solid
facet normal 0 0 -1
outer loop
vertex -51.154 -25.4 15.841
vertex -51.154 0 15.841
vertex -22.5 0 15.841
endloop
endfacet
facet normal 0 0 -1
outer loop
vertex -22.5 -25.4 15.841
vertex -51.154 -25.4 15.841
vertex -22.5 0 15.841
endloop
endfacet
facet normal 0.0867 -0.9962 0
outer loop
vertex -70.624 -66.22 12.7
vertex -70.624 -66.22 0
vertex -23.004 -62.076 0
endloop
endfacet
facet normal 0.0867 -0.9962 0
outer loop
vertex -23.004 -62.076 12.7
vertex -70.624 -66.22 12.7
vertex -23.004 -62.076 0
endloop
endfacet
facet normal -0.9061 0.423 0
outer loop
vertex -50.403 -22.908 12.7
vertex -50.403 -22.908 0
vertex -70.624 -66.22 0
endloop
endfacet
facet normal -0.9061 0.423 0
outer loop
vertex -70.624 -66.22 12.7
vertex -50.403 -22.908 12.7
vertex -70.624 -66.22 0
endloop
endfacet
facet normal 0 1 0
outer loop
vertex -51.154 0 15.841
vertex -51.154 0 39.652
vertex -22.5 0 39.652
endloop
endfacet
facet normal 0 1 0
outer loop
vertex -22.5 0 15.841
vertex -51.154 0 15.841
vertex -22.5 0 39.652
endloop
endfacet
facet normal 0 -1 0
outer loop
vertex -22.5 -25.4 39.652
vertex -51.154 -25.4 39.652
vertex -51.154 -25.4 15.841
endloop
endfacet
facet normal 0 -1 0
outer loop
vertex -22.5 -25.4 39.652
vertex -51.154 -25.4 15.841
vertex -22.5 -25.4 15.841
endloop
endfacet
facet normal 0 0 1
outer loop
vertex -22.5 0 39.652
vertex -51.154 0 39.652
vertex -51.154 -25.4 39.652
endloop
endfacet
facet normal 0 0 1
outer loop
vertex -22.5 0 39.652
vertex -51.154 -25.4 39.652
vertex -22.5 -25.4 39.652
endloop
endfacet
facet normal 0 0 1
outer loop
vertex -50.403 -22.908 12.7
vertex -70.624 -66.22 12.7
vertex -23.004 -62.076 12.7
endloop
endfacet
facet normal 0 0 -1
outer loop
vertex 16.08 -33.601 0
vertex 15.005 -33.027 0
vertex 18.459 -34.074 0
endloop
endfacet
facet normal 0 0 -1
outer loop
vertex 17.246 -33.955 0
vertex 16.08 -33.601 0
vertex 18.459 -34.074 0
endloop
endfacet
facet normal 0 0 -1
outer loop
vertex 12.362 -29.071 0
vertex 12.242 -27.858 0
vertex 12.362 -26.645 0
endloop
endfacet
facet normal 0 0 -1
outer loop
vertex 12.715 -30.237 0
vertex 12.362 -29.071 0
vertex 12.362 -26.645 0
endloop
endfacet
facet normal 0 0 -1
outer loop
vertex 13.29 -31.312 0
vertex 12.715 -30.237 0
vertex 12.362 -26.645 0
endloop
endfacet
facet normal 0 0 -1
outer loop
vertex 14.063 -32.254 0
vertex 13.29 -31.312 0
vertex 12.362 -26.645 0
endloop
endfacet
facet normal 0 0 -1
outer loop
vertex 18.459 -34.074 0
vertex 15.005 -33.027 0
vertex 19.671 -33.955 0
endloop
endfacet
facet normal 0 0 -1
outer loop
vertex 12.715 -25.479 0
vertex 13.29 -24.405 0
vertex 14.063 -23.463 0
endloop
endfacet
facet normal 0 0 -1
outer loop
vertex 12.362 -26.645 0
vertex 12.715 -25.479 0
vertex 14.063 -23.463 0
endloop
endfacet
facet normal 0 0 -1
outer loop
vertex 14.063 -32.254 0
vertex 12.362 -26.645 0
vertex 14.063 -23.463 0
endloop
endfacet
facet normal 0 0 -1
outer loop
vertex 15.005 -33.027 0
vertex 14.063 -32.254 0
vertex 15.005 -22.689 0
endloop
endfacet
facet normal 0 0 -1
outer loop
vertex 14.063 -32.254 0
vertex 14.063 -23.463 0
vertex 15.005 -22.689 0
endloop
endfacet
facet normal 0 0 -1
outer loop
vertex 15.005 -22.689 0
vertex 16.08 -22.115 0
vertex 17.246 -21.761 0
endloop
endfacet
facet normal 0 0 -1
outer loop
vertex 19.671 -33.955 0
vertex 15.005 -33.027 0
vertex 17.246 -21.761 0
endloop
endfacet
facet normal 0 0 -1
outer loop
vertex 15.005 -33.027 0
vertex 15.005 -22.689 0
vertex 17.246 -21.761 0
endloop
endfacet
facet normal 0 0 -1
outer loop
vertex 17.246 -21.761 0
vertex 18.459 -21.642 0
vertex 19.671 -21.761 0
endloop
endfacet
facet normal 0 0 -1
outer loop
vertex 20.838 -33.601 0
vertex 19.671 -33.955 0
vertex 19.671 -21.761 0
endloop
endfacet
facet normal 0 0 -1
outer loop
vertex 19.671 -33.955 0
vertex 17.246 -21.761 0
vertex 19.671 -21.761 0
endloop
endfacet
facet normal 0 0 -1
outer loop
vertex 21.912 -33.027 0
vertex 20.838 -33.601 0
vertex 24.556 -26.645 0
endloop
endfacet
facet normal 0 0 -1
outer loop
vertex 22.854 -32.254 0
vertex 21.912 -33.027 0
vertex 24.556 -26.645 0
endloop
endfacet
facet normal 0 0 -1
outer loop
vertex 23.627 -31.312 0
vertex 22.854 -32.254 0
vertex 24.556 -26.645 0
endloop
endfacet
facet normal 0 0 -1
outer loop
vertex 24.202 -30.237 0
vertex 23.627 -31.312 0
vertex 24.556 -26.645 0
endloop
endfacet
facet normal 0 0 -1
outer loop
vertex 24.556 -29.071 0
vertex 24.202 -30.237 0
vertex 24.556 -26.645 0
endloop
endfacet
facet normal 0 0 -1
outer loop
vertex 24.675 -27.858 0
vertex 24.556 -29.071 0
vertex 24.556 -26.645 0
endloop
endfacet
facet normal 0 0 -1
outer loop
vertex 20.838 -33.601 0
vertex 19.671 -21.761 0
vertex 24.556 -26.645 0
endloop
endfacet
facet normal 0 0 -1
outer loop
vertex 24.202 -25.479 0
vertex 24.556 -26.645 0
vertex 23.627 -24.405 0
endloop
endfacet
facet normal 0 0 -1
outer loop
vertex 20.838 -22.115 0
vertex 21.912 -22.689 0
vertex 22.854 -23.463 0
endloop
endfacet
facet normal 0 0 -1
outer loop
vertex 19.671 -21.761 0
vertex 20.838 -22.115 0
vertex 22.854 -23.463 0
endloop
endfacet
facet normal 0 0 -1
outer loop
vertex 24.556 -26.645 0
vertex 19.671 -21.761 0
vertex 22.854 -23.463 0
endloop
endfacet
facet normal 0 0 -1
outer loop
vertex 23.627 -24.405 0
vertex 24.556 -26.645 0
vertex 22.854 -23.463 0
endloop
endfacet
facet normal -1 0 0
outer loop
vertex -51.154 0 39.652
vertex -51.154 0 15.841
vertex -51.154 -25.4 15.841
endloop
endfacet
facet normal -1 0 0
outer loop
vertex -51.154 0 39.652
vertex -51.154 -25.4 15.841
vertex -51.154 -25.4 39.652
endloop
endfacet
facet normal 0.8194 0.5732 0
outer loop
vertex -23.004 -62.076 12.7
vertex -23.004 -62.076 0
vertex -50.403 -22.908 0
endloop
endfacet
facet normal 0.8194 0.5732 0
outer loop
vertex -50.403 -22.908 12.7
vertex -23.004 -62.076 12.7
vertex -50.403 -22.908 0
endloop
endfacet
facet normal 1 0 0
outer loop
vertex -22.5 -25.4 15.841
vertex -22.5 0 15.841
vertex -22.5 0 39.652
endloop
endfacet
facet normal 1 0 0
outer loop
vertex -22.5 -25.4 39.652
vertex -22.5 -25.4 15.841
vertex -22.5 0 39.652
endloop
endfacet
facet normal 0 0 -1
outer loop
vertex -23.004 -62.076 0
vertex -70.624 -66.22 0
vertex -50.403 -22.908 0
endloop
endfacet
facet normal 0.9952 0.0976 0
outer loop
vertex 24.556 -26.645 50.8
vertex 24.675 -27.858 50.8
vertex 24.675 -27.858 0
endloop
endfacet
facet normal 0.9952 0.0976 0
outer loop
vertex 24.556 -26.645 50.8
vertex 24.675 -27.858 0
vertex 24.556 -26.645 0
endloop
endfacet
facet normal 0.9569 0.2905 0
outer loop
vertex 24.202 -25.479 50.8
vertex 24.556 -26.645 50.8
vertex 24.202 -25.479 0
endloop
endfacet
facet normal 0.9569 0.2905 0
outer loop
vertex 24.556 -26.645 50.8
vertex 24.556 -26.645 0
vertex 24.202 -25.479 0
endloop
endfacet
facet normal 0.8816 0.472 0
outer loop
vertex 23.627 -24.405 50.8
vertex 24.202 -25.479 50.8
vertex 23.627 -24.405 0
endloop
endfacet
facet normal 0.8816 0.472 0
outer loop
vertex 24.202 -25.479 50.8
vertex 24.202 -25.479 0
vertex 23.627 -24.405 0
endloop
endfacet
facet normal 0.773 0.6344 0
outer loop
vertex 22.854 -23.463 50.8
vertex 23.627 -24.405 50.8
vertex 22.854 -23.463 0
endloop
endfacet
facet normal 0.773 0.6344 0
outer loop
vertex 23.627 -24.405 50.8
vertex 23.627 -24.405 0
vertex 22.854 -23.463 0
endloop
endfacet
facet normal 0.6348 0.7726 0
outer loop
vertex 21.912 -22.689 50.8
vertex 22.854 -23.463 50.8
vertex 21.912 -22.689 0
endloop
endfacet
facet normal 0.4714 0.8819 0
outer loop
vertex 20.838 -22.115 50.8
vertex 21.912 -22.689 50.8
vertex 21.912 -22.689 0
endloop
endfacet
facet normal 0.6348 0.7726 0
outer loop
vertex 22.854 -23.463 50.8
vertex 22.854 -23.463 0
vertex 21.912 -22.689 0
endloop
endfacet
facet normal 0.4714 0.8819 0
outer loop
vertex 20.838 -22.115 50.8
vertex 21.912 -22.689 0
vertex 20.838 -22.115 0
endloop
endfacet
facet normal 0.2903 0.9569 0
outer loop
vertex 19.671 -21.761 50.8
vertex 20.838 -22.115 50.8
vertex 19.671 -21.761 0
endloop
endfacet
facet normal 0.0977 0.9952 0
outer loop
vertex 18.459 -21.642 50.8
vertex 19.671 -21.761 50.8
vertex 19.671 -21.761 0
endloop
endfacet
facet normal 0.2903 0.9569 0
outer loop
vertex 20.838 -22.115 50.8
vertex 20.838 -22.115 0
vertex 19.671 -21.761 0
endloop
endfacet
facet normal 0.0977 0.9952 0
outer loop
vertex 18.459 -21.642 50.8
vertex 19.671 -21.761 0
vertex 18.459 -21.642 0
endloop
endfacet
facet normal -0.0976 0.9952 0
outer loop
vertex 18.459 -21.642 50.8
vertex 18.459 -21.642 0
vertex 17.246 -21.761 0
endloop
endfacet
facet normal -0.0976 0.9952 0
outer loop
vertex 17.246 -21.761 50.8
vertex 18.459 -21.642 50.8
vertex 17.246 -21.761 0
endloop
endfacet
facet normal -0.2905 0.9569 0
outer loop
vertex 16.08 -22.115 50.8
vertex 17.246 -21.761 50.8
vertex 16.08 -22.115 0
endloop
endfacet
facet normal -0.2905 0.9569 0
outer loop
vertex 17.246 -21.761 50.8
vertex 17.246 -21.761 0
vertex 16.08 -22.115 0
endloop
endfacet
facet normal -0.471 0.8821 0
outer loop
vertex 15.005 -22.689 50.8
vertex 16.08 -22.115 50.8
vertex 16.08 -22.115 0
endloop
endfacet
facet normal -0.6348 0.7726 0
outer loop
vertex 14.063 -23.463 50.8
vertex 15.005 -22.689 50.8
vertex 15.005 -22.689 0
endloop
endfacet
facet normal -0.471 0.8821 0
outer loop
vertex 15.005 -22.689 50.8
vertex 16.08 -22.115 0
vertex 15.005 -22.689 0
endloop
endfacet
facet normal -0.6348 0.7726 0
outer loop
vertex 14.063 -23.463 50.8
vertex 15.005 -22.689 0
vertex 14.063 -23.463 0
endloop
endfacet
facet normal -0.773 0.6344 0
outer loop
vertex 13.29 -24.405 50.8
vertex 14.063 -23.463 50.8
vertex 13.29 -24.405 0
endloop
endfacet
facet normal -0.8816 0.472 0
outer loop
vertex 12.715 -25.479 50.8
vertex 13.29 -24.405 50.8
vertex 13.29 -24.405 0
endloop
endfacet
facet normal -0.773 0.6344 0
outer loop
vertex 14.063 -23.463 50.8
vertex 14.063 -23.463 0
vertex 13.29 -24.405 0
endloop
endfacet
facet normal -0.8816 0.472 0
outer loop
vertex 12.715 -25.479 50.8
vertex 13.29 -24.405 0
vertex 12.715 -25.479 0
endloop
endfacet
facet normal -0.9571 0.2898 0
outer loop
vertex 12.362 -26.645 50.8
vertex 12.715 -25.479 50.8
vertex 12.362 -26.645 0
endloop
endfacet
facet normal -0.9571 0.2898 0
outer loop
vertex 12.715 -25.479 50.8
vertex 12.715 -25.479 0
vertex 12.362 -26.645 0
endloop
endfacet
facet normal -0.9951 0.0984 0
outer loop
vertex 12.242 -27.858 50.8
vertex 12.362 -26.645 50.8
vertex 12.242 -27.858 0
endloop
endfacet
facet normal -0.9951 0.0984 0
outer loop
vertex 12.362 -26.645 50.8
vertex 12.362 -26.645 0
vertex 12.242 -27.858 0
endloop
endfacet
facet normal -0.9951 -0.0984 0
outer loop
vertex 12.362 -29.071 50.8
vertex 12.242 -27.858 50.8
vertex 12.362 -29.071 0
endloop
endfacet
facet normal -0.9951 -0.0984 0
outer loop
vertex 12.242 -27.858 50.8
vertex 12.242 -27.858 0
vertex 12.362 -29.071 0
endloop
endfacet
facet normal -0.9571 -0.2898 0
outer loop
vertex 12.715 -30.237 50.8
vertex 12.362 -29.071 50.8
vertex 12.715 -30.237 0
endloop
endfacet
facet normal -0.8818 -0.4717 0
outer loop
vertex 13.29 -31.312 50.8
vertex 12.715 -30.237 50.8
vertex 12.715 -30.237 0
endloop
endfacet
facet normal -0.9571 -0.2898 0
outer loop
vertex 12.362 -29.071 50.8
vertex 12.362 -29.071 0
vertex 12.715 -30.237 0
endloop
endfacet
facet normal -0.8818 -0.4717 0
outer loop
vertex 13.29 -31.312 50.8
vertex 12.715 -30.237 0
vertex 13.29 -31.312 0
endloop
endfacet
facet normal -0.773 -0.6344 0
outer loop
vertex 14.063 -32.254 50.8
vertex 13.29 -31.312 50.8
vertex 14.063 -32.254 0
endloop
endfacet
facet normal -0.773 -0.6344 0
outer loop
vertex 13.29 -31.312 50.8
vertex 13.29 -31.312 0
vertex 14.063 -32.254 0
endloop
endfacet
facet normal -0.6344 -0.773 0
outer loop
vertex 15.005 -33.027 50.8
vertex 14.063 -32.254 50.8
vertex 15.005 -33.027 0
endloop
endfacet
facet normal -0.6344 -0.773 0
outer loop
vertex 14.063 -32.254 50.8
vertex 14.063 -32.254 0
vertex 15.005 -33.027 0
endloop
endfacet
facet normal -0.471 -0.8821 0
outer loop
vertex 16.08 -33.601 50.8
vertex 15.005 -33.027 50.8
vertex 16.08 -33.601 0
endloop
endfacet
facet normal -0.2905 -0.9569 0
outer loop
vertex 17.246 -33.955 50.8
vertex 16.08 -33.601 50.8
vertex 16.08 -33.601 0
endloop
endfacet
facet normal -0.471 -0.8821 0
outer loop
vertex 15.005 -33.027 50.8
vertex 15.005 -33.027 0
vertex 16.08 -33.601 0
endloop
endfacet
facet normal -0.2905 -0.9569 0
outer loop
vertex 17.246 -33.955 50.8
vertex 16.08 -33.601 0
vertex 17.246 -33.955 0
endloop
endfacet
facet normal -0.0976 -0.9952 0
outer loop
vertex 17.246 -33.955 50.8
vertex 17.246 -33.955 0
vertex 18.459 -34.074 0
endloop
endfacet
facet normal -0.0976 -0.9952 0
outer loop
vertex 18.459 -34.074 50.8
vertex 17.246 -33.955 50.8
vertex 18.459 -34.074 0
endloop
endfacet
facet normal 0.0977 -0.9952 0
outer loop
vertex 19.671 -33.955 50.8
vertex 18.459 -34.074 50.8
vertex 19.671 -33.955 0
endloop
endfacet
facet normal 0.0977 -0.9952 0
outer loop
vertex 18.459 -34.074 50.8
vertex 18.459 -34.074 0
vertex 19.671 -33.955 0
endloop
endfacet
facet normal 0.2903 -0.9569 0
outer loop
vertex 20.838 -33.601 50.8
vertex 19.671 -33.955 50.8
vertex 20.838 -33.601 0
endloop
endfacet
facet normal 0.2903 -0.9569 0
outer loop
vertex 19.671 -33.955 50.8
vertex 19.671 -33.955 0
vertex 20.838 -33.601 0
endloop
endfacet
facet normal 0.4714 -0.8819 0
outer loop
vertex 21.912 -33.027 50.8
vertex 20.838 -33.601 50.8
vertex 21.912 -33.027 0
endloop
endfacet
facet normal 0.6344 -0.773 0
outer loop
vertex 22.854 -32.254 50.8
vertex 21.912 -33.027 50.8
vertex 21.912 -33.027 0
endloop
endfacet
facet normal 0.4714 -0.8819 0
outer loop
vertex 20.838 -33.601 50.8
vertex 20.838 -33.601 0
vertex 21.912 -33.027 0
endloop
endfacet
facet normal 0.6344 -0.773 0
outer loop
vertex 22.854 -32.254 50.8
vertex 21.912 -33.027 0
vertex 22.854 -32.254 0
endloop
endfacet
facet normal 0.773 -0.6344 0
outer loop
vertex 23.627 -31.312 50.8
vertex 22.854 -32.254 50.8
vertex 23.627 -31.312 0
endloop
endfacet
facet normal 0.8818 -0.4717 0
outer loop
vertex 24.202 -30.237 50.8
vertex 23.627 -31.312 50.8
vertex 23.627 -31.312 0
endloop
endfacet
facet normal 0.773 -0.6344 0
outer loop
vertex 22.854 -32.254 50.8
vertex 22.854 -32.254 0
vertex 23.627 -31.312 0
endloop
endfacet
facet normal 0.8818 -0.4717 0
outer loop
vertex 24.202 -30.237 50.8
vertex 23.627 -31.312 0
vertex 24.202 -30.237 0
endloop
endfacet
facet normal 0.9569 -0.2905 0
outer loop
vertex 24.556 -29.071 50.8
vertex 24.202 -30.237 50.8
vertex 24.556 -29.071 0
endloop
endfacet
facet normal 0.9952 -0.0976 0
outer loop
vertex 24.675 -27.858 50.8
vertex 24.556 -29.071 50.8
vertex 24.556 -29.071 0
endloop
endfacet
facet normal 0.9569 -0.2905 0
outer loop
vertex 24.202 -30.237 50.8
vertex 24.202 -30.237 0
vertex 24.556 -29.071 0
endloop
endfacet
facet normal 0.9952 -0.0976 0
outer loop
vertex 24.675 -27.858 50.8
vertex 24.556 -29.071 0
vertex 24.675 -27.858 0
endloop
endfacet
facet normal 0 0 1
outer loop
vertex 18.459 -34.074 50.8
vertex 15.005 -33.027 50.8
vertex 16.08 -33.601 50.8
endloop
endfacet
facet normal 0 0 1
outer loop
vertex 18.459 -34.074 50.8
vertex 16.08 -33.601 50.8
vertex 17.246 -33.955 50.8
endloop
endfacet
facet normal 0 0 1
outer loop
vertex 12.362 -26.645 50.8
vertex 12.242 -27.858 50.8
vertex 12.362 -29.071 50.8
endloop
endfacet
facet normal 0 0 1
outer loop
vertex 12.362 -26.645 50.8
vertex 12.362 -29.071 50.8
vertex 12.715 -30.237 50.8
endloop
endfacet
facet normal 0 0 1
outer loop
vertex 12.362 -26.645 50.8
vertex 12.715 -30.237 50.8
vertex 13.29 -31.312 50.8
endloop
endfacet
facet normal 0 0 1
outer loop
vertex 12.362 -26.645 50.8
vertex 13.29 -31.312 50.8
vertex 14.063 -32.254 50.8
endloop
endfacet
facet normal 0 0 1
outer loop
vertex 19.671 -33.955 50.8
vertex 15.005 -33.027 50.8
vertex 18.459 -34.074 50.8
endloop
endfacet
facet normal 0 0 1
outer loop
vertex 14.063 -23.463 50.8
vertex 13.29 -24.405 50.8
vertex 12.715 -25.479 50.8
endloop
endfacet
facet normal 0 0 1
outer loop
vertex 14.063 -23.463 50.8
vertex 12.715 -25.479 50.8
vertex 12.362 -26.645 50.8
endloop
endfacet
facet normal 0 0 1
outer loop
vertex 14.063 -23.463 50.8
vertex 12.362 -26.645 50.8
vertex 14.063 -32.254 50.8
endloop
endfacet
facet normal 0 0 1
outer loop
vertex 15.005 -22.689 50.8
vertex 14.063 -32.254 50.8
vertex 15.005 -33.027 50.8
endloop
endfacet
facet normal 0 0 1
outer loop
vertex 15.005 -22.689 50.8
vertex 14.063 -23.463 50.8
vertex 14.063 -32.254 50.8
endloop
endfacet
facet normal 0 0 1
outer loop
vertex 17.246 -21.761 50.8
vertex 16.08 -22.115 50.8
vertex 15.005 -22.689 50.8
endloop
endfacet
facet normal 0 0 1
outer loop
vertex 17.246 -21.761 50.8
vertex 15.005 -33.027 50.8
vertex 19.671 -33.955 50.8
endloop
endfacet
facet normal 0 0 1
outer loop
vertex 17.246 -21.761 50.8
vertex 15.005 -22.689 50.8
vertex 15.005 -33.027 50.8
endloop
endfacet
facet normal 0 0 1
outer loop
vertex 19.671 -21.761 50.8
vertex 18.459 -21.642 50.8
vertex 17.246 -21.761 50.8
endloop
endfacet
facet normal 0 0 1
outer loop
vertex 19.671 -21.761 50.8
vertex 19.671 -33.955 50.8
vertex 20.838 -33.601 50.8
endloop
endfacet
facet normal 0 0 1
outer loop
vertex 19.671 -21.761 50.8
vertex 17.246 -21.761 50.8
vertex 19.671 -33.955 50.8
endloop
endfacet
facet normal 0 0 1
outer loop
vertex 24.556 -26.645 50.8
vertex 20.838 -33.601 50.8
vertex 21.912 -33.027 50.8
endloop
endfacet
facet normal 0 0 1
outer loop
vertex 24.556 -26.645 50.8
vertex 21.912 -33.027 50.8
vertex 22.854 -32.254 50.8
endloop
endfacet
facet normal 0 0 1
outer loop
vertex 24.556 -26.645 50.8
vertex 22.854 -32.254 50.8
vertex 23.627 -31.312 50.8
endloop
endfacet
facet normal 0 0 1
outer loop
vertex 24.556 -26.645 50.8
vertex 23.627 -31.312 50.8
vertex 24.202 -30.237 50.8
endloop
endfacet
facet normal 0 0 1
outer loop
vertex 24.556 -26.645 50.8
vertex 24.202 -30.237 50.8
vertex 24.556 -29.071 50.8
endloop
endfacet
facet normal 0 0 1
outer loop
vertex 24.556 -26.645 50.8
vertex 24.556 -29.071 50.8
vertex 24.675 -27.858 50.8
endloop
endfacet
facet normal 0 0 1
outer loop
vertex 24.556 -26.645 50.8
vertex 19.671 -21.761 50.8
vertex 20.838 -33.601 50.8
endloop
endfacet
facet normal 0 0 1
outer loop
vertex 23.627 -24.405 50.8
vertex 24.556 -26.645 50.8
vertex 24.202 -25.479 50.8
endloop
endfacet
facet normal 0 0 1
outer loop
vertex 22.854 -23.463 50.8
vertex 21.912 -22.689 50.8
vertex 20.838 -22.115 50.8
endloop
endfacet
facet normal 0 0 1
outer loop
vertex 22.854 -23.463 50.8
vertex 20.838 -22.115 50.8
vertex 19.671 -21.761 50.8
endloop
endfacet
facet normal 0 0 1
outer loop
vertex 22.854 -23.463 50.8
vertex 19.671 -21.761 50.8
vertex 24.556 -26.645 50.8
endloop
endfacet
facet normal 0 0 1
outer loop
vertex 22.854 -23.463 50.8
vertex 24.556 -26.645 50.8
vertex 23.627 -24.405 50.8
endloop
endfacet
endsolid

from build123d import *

# Parameters (mm, degrees)
F1_R     = 6.216348
F2_DEPTH = 50.8
F0_W     = 28.654275
F0_H     = 23.811299
F3_DEPTH = 25.4
F5_DEPTH = 12.7


with BuildPart() as f2:
    # F1 (on Top) → F2 (new body)
    with BuildSketch(Plane.XY):
        with Locations((18.458644, -27.858142)):
            Circle(F1_R)
    extrude(amount=F2_DEPTH)


with BuildPart() as f3:
    # F0 (on Front) → F3 (new body)
    with BuildSketch(Plane.XZ):
        with Locations((-36.826797, 27.746217)):
            Rectangle(F0_W, F0_H)
    extrude(amount=F3_DEPTH)


with BuildPart() as f5:
    # F4 (on Top) → F5 (new body)
    with BuildSketch(Plane.XY):
        Polygon((-23.004015, -62.0765), (-50.402704, -22.907847), (-70.624407, -66.220134), align=None)
    extrude(amount=F5_DEPTH)


solid = Compound([f2.part, f3.part, f5.part])
